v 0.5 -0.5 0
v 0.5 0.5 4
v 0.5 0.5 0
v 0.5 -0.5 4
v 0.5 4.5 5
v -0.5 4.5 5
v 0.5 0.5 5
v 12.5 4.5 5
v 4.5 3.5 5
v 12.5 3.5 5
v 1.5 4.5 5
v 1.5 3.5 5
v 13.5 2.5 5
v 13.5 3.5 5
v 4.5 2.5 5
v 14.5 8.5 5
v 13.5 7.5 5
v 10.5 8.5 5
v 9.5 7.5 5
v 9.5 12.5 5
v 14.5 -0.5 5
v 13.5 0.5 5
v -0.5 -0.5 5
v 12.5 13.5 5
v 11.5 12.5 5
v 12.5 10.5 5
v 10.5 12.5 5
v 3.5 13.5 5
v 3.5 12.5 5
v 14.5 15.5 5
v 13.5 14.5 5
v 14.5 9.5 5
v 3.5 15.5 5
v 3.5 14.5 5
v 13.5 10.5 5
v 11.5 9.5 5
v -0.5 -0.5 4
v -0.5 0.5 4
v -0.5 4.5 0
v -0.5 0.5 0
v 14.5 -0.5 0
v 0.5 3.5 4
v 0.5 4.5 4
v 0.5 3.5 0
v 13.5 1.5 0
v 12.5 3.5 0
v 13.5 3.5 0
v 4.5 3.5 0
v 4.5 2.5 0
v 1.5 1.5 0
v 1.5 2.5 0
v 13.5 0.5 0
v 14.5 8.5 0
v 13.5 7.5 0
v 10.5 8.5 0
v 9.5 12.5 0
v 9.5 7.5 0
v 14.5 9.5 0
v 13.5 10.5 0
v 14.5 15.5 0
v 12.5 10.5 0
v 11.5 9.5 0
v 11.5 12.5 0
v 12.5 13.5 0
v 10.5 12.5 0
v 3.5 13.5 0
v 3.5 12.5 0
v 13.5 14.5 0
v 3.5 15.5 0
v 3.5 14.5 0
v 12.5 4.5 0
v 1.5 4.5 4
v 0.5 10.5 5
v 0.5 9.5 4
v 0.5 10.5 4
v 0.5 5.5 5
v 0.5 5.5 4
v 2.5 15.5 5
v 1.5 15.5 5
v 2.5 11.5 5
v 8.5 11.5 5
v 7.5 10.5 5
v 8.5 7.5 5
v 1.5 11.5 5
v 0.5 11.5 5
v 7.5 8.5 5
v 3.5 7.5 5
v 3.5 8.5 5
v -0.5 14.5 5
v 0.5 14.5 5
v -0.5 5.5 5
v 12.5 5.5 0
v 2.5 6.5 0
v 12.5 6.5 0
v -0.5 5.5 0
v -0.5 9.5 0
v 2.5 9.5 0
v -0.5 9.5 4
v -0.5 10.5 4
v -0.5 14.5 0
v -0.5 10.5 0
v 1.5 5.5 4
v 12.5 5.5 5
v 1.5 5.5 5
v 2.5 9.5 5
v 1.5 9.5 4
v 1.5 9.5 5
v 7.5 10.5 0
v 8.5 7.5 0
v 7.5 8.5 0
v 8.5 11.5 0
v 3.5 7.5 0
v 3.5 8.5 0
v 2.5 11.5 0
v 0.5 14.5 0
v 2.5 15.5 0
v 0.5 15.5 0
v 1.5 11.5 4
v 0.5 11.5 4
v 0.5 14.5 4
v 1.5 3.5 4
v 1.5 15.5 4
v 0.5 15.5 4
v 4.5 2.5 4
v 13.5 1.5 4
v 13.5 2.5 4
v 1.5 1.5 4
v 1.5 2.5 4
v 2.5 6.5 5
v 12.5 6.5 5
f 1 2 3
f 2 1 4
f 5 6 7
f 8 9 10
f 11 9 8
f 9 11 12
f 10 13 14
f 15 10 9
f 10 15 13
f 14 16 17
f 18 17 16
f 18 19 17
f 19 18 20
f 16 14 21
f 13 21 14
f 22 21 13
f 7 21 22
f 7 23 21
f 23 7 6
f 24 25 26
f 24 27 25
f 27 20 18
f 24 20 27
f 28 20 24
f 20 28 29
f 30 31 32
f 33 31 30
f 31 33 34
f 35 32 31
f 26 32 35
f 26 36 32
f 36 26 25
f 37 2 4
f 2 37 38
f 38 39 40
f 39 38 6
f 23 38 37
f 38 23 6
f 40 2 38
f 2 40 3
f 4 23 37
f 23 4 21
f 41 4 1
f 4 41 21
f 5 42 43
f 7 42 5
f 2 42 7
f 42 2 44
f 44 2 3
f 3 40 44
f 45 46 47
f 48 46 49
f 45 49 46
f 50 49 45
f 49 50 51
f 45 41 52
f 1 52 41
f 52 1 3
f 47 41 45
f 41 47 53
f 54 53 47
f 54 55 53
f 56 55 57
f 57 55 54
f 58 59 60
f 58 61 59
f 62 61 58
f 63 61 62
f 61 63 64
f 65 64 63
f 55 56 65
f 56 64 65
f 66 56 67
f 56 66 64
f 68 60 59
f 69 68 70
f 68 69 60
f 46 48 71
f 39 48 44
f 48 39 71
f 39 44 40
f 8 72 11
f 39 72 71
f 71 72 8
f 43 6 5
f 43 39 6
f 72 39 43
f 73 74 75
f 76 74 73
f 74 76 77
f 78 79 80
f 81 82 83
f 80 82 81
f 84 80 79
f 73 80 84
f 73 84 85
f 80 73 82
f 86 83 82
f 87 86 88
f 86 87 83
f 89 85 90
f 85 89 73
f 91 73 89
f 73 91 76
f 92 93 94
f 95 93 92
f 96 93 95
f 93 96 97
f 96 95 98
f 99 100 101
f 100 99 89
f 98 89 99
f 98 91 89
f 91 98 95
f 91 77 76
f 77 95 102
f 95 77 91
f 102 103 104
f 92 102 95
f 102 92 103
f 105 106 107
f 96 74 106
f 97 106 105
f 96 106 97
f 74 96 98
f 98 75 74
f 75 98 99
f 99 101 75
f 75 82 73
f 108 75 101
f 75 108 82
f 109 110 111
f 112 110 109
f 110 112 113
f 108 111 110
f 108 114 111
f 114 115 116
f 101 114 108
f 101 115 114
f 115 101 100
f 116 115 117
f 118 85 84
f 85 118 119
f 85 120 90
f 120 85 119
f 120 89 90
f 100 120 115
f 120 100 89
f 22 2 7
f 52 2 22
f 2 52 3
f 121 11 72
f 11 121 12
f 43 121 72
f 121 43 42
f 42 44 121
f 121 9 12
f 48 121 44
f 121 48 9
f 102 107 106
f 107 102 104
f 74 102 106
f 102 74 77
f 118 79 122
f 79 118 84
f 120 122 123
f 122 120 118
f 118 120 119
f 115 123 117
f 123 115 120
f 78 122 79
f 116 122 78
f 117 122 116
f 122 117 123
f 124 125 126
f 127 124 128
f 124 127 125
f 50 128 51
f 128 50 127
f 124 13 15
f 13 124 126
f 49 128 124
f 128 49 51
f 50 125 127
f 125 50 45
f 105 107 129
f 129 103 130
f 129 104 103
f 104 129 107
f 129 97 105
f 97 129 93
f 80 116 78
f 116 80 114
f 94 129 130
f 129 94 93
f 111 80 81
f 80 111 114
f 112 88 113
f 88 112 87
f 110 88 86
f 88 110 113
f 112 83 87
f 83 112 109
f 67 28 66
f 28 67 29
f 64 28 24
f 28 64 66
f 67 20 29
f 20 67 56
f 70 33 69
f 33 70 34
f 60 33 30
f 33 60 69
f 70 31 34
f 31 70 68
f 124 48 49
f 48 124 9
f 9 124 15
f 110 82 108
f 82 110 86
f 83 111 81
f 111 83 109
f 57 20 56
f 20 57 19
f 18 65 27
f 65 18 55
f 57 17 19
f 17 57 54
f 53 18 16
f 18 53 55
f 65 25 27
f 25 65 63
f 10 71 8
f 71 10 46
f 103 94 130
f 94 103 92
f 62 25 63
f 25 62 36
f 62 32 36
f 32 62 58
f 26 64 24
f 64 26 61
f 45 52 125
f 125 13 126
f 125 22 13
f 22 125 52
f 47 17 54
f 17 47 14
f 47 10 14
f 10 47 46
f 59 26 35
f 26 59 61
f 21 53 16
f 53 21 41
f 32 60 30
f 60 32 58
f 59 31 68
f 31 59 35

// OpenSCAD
union() {
    translate([0, 0, 4.5]) color([1, 0, 0]) cube([1, 1, 1], center=true);
    translate([0, 1, 2.5]) cube([1, 1, 5], center=true);
    translate([0, 2, 2.5]) cube([1, 1, 5], center=true);
    translate([0, 3, 2.5]) cube([1, 1, 5], center=true);
    translate([0, 4, 2.5]) cube([1, 1, 5], center=true);
    translate([0, 6, 2.5]) cube([1, 1, 5], center=true);
    translate([0, 7, 2.5]) cube([1, 1, 5], center=true);
    translate([0, 8, 2.5]) cube([1, 1, 5], center=true);
    translate([0, 9, 2.5]) cube([1, 1, 5], center=true);
    translate([0, 10, 4.5]) color([0, 0, 1]) cube([1, 1, 1], center=true);
    translate([0, 11, 2.5]) cube([1, 1, 5], center=true);
    translate([0, 12, 2.5]) cube([1, 1, 5], center=true);
    translate([0, 13, 2.5]) cube([1, 1, 5], center=true);
    translate([0, 14, 2.5]) cube([1, 1, 5], center=true);
    translate([1, 0, 2.5]) cube([1, 1, 5], center=true);
    translate([1, 4, 2.0]) cube([1, 1, 4], center=true);
    translate([1, 6, 2.0]) cube([1, 1, 4], center=true);
    translate([1, 7, 2.0]) cube([1, 1, 4], center=true);
    translate([1, 8, 2.0]) cube([1, 1, 4], center=true);
    translate([1, 9, 2.0]) cube([1, 1, 4], center=true);
    translate([1, 11, 2.5]) cube([1, 1, 5], center=true);
    translate([1, 12, 2.0]) cube([1, 1, 4], center=true);
    translate([1, 13, 2.0]) cube([1, 1, 4], center=true);
    translate([1, 14, 2.0]) cube([1, 1, 4], center=true);
    translate([1, 15, 2.0]) cube([1, 1, 4], center=true);
    translate([2, 0, 2.5]) cube([1, 1, 5], center=true);
    translate([2, 2, 2.0]) cube([1, 1, 4], center=true);
    translate([2, 4, 2.5]) cube([1, 1, 5], center=true);
    translate([2, 6, 2.5]) cube([1, 1, 5], center=true);
    translate([2, 7, 2.5]) cube([1, 1, 5], center=true);
    translate([2, 8, 2.5]) cube([1, 1, 5], center=true);
    translate([2, 9, 2.5]) cube([1, 1, 5], center=true);
    translate([2, 11, 2.5]) cube([1, 1, 5], center=true);
    translate([2, 12, 2.5]) cube([1, 1, 5], center=true);
    translate([2, 13, 2.5]) cube([1, 1, 5], center=true);
    translate([2, 14, 2.5]) cube([1, 1, 5], center=true);
    translate([2, 15, 2.5]) cube([1, 1, 5], center=true);
    translate([3, 0, 2.5]) cube([1, 1, 5], center=true);
    translate([3, 2, 2.0]) cube([1, 1, 4], center=true);
    translate([3, 4, 2.5]) cube([1, 1, 5], center=true);
    translate([3, 6, 2.5]) cube([1, 1, 5], center=true);
    translate([3, 11, 2.5]) cube([1, 1, 5], center=true);
    translate([4, 0, 2.5]) cube([1, 1, 5], center=true);
    translate([4, 2, 2.0]) cube([1, 1, 4], center=true);
    translate([4, 4, 2.5]) cube([1, 1, 5], center=true);
    translate([4, 6, 2.5]) cube([1, 1, 5], center=true);
    translate([4, 8, 2.5]) cube([1, 1, 5], center=true);
    translate([4, 11, 2.5]) cube([1, 1, 5], center=true);
    translate([4, 13, 2.5]) cube([1, 1, 5], center=true);
    translate([4, 15, 2.5]) cube([1, 1, 5], center=true);
    translate([5, 0, 2.5]) cube([1, 1, 5], center=true);
    translate([5, 2, 2.0]) cube([1, 1, 4], center=true);
    translate([5, 3, 2.5]) cube([1, 1, 5], center=true);
    translate([5, 4, 2.5]) cube([1, 1, 5], center=true);
    translate([5, 6, 2.5]) cube([1, 1, 5], center=true);
    translate([5, 8, 2.5]) cube([1, 1, 5], center=true);
    translate([5, 11, 2.5]) cube([1, 1, 5], center=true);
    translate([5, 13, 2.5]) cube([1, 1, 5], center=true);
    translate([5, 15, 2.5]) cube([1, 1, 5], center=true);
    translate([6, 0, 2.5]) cube([1, 1, 5], center=true);
    translate([6, 2, 2.0]) cube([1, 1, 4], center=true);
    translate([6, 3, 2.5]) cube([1, 1, 5], center=true);
    translate([6, 4, 2.5]) cube([1, 1, 5], center=true);
    translate([6, 6, 2.5]) cube([1, 1, 5], center=true);
    translate([6, 8, 2.5]) cube([1, 1, 5], center=true);
    translate([6, 11, 2.5]) cube([1, 1, 5], center=true);
    translate([6, 13, 2.5]) cube([1, 1, 5], center=true);
    translate([6, 15, 2.5]) cube([1, 1, 5], center=true);
    translate([7, 0, 2.5]) cube([1, 1, 5], center=true);
    translate([7, 2, 2.0]) cube([1, 1, 4], center=true);
    translate([7, 3, 2.5]) cube([1, 1, 5], center=true);
    translate([7, 4, 2.5]) cube([1, 1, 5], center=true);
    translate([7, 6, 2.5]) cube([1, 1, 5], center=true);
    translate([7, 8, 2.5]) cube([1, 1, 5], center=true);
    translate([7, 11, 2.5]) cube([1, 1, 5], center=true);
    translate([7, 13, 2.5]) cube([1, 1, 5], center=true);
    translate([7, 15, 2.5]) cube([1, 1, 5], center=true);
    translate([8, 0, 2.5]) cube([1, 1, 5], center=true);
    translate([8, 2, 2.0]) cube([1, 1, 4], center=true);
    translate([8, 3, 2.5]) cube([1, 1, 5], center=true);
    translate([8, 4, 2.5]) cube([1, 1, 5], center=true);
    translate([8, 6, 2.5]) cube([1, 1, 5], center=true);
    translate([8, 8, 2.5]) cube([1, 1, 5], center=true);
    translate([8, 9, 2.5]) cube([1, 1, 5], center=true);
    translate([8, 10, 2.5]) cube([1, 1, 5], center=true);
    translate([8, 11, 2.5]) cube([1, 1, 5], center=true);
    translate([8, 13, 2.5]) cube([1, 1, 5], center=true);
    translate([8, 15, 2.5]) cube([1, 1, 5], center=true);
    translate([9, 0, 2.5]) cube([1, 1, 5], center=true);
    translate([9, 2, 2.0]) cube([1, 1, 4], center=true);
    translate([9, 3, 2.5]) cube([1, 1, 5], center=true);
    translate([9, 4, 2.5]) cube([1, 1, 5], center=true);
    translate([9, 6, 2.5]) cube([1, 1, 5], center=true);
    translate([9, 13, 2.5]) cube([1, 1, 5], center=true);
    translate([9, 15, 2.5]) cube([1, 1, 5], center=true);
    translate([10, 0, 2.5]) cube([1, 1, 5], center=true);
    translate([10, 2, 2.0]) cube([1, 1, 4], center=true);
    translate([10, 3, 2.5]) cube([1, 1, 5], center=true);
    translate([10, 4, 2.5]) cube([1, 1, 5], center=true);
    translate([10, 6, 2.5]) cube([1, 1, 5], center=true);
    translate([10, 8, 2.5]) cube([1, 1, 5], center=true);
    translate([10, 9, 2.5]) cube([1, 1, 5], center=true);
    translate([10, 10, 2.5]) cube([1, 1, 5], center=true);
    translate([10, 11, 2.5]) cube([1, 1, 5], center=true);
    translate([10, 12, 2.5]) cube([1, 1, 5], center=true);
    translate([10, 13, 2.5]) cube([1, 1, 5], center=true);
    translate([10, 15, 2.5]) cube([1, 1, 5], center=true);
    translate([11, 0, 2.5]) cube([1, 1, 5], center=true);
    translate([11, 2, 2.0]) cube([1, 1, 4], center=true);
    translate([11, 3, 2.5]) cube([1, 1, 5], center=true);
    translate([11, 4, 2.5]) cube([1, 1, 5], center=true);
    translate([11, 6, 2.5]) cube([1, 1, 5], center=true);
    translate([11, 8, 2.5]) cube([1, 1, 5], center=true);
    translate([11, 13, 2.5]) cube([1, 1, 5], center=true);
    translate([11, 15, 2.5]) cube([1, 1, 5], center=true);
    translate([12, 0, 2.5]) cube([1, 1, 5], center=true);
    translate([12, 2, 2.0]) cube([1, 1, 4], center=true);
    translate([12, 3, 2.5]) cube([1, 1, 5], center=true);
    translate([12, 4, 2.5]) cube([1, 1, 5], center=true);
    translate([12, 6, 2.5]) cube([1, 1, 5], center=true);
    translate([12, 8, 2.5]) cube([1, 1, 5], center=true);
    translate([12, 10, 2.5]) cube([1, 1, 5], center=true);
    translate([12, 11, 2.5]) cube([1, 1, 5], center=true);
    translate([12, 12, 2.5]) cube([1, 1, 5], center=true);
    translate([12, 13, 2.5]) cube([1, 1, 5], center=true);
    translate([12, 15, 2.5]) cube([1, 1, 5], center=true);
    translate([13, 0, 2.5]) cube([1, 1, 5], center=true);
    translate([13, 2, 2.0]) cube([1, 1, 4], center=true);
    translate([13, 3, 2.5]) cube([1, 1, 5], center=true);
    translate([13, 8, 2.5]) cube([1, 1, 5], center=true);
    translate([13, 10, 2.5]) cube([1, 1, 5], center=true);
    translate([13, 15, 2.5]) cube([1, 1, 5], center=true);
    translate([14, 0, 2.5]) cube([1, 1, 5], center=true);
    translate([14, 1, 2.5]) cube([1, 1, 5], center=true);
    translate([14, 2, 2.5]) cube([1, 1, 5], center=true);
    translate([14, 3, 2.5]) cube([1, 1, 5], center=true);
    translate([14, 4, 2.5]) cube([1, 1, 5], center=true);
    translate([14, 5, 2.5]) cube([1, 1, 5], center=true);
    translate([14, 6, 2.5]) cube([1, 1, 5], center=true);
    translate([14, 7, 2.5]) cube([1, 1, 5], center=true);
    translate([14, 8, 2.5]) cube([1, 1, 5], center=true);
    translate([14, 10, 2.5]) cube([1, 1, 5], center=true);
    translate([14, 11, 2.5]) cube([1, 1, 5], center=true);
    translate([14, 12, 2.5]) cube([1, 1, 5], center=true);
    translate([14, 13, 2.5]) cube([1, 1, 5], center=true);
    translate([14, 14, 2.5]) cube([1, 1, 5], center=true);
    translate([14, 15, 2.5]) cube([1, 1, 5], center=true);
}
